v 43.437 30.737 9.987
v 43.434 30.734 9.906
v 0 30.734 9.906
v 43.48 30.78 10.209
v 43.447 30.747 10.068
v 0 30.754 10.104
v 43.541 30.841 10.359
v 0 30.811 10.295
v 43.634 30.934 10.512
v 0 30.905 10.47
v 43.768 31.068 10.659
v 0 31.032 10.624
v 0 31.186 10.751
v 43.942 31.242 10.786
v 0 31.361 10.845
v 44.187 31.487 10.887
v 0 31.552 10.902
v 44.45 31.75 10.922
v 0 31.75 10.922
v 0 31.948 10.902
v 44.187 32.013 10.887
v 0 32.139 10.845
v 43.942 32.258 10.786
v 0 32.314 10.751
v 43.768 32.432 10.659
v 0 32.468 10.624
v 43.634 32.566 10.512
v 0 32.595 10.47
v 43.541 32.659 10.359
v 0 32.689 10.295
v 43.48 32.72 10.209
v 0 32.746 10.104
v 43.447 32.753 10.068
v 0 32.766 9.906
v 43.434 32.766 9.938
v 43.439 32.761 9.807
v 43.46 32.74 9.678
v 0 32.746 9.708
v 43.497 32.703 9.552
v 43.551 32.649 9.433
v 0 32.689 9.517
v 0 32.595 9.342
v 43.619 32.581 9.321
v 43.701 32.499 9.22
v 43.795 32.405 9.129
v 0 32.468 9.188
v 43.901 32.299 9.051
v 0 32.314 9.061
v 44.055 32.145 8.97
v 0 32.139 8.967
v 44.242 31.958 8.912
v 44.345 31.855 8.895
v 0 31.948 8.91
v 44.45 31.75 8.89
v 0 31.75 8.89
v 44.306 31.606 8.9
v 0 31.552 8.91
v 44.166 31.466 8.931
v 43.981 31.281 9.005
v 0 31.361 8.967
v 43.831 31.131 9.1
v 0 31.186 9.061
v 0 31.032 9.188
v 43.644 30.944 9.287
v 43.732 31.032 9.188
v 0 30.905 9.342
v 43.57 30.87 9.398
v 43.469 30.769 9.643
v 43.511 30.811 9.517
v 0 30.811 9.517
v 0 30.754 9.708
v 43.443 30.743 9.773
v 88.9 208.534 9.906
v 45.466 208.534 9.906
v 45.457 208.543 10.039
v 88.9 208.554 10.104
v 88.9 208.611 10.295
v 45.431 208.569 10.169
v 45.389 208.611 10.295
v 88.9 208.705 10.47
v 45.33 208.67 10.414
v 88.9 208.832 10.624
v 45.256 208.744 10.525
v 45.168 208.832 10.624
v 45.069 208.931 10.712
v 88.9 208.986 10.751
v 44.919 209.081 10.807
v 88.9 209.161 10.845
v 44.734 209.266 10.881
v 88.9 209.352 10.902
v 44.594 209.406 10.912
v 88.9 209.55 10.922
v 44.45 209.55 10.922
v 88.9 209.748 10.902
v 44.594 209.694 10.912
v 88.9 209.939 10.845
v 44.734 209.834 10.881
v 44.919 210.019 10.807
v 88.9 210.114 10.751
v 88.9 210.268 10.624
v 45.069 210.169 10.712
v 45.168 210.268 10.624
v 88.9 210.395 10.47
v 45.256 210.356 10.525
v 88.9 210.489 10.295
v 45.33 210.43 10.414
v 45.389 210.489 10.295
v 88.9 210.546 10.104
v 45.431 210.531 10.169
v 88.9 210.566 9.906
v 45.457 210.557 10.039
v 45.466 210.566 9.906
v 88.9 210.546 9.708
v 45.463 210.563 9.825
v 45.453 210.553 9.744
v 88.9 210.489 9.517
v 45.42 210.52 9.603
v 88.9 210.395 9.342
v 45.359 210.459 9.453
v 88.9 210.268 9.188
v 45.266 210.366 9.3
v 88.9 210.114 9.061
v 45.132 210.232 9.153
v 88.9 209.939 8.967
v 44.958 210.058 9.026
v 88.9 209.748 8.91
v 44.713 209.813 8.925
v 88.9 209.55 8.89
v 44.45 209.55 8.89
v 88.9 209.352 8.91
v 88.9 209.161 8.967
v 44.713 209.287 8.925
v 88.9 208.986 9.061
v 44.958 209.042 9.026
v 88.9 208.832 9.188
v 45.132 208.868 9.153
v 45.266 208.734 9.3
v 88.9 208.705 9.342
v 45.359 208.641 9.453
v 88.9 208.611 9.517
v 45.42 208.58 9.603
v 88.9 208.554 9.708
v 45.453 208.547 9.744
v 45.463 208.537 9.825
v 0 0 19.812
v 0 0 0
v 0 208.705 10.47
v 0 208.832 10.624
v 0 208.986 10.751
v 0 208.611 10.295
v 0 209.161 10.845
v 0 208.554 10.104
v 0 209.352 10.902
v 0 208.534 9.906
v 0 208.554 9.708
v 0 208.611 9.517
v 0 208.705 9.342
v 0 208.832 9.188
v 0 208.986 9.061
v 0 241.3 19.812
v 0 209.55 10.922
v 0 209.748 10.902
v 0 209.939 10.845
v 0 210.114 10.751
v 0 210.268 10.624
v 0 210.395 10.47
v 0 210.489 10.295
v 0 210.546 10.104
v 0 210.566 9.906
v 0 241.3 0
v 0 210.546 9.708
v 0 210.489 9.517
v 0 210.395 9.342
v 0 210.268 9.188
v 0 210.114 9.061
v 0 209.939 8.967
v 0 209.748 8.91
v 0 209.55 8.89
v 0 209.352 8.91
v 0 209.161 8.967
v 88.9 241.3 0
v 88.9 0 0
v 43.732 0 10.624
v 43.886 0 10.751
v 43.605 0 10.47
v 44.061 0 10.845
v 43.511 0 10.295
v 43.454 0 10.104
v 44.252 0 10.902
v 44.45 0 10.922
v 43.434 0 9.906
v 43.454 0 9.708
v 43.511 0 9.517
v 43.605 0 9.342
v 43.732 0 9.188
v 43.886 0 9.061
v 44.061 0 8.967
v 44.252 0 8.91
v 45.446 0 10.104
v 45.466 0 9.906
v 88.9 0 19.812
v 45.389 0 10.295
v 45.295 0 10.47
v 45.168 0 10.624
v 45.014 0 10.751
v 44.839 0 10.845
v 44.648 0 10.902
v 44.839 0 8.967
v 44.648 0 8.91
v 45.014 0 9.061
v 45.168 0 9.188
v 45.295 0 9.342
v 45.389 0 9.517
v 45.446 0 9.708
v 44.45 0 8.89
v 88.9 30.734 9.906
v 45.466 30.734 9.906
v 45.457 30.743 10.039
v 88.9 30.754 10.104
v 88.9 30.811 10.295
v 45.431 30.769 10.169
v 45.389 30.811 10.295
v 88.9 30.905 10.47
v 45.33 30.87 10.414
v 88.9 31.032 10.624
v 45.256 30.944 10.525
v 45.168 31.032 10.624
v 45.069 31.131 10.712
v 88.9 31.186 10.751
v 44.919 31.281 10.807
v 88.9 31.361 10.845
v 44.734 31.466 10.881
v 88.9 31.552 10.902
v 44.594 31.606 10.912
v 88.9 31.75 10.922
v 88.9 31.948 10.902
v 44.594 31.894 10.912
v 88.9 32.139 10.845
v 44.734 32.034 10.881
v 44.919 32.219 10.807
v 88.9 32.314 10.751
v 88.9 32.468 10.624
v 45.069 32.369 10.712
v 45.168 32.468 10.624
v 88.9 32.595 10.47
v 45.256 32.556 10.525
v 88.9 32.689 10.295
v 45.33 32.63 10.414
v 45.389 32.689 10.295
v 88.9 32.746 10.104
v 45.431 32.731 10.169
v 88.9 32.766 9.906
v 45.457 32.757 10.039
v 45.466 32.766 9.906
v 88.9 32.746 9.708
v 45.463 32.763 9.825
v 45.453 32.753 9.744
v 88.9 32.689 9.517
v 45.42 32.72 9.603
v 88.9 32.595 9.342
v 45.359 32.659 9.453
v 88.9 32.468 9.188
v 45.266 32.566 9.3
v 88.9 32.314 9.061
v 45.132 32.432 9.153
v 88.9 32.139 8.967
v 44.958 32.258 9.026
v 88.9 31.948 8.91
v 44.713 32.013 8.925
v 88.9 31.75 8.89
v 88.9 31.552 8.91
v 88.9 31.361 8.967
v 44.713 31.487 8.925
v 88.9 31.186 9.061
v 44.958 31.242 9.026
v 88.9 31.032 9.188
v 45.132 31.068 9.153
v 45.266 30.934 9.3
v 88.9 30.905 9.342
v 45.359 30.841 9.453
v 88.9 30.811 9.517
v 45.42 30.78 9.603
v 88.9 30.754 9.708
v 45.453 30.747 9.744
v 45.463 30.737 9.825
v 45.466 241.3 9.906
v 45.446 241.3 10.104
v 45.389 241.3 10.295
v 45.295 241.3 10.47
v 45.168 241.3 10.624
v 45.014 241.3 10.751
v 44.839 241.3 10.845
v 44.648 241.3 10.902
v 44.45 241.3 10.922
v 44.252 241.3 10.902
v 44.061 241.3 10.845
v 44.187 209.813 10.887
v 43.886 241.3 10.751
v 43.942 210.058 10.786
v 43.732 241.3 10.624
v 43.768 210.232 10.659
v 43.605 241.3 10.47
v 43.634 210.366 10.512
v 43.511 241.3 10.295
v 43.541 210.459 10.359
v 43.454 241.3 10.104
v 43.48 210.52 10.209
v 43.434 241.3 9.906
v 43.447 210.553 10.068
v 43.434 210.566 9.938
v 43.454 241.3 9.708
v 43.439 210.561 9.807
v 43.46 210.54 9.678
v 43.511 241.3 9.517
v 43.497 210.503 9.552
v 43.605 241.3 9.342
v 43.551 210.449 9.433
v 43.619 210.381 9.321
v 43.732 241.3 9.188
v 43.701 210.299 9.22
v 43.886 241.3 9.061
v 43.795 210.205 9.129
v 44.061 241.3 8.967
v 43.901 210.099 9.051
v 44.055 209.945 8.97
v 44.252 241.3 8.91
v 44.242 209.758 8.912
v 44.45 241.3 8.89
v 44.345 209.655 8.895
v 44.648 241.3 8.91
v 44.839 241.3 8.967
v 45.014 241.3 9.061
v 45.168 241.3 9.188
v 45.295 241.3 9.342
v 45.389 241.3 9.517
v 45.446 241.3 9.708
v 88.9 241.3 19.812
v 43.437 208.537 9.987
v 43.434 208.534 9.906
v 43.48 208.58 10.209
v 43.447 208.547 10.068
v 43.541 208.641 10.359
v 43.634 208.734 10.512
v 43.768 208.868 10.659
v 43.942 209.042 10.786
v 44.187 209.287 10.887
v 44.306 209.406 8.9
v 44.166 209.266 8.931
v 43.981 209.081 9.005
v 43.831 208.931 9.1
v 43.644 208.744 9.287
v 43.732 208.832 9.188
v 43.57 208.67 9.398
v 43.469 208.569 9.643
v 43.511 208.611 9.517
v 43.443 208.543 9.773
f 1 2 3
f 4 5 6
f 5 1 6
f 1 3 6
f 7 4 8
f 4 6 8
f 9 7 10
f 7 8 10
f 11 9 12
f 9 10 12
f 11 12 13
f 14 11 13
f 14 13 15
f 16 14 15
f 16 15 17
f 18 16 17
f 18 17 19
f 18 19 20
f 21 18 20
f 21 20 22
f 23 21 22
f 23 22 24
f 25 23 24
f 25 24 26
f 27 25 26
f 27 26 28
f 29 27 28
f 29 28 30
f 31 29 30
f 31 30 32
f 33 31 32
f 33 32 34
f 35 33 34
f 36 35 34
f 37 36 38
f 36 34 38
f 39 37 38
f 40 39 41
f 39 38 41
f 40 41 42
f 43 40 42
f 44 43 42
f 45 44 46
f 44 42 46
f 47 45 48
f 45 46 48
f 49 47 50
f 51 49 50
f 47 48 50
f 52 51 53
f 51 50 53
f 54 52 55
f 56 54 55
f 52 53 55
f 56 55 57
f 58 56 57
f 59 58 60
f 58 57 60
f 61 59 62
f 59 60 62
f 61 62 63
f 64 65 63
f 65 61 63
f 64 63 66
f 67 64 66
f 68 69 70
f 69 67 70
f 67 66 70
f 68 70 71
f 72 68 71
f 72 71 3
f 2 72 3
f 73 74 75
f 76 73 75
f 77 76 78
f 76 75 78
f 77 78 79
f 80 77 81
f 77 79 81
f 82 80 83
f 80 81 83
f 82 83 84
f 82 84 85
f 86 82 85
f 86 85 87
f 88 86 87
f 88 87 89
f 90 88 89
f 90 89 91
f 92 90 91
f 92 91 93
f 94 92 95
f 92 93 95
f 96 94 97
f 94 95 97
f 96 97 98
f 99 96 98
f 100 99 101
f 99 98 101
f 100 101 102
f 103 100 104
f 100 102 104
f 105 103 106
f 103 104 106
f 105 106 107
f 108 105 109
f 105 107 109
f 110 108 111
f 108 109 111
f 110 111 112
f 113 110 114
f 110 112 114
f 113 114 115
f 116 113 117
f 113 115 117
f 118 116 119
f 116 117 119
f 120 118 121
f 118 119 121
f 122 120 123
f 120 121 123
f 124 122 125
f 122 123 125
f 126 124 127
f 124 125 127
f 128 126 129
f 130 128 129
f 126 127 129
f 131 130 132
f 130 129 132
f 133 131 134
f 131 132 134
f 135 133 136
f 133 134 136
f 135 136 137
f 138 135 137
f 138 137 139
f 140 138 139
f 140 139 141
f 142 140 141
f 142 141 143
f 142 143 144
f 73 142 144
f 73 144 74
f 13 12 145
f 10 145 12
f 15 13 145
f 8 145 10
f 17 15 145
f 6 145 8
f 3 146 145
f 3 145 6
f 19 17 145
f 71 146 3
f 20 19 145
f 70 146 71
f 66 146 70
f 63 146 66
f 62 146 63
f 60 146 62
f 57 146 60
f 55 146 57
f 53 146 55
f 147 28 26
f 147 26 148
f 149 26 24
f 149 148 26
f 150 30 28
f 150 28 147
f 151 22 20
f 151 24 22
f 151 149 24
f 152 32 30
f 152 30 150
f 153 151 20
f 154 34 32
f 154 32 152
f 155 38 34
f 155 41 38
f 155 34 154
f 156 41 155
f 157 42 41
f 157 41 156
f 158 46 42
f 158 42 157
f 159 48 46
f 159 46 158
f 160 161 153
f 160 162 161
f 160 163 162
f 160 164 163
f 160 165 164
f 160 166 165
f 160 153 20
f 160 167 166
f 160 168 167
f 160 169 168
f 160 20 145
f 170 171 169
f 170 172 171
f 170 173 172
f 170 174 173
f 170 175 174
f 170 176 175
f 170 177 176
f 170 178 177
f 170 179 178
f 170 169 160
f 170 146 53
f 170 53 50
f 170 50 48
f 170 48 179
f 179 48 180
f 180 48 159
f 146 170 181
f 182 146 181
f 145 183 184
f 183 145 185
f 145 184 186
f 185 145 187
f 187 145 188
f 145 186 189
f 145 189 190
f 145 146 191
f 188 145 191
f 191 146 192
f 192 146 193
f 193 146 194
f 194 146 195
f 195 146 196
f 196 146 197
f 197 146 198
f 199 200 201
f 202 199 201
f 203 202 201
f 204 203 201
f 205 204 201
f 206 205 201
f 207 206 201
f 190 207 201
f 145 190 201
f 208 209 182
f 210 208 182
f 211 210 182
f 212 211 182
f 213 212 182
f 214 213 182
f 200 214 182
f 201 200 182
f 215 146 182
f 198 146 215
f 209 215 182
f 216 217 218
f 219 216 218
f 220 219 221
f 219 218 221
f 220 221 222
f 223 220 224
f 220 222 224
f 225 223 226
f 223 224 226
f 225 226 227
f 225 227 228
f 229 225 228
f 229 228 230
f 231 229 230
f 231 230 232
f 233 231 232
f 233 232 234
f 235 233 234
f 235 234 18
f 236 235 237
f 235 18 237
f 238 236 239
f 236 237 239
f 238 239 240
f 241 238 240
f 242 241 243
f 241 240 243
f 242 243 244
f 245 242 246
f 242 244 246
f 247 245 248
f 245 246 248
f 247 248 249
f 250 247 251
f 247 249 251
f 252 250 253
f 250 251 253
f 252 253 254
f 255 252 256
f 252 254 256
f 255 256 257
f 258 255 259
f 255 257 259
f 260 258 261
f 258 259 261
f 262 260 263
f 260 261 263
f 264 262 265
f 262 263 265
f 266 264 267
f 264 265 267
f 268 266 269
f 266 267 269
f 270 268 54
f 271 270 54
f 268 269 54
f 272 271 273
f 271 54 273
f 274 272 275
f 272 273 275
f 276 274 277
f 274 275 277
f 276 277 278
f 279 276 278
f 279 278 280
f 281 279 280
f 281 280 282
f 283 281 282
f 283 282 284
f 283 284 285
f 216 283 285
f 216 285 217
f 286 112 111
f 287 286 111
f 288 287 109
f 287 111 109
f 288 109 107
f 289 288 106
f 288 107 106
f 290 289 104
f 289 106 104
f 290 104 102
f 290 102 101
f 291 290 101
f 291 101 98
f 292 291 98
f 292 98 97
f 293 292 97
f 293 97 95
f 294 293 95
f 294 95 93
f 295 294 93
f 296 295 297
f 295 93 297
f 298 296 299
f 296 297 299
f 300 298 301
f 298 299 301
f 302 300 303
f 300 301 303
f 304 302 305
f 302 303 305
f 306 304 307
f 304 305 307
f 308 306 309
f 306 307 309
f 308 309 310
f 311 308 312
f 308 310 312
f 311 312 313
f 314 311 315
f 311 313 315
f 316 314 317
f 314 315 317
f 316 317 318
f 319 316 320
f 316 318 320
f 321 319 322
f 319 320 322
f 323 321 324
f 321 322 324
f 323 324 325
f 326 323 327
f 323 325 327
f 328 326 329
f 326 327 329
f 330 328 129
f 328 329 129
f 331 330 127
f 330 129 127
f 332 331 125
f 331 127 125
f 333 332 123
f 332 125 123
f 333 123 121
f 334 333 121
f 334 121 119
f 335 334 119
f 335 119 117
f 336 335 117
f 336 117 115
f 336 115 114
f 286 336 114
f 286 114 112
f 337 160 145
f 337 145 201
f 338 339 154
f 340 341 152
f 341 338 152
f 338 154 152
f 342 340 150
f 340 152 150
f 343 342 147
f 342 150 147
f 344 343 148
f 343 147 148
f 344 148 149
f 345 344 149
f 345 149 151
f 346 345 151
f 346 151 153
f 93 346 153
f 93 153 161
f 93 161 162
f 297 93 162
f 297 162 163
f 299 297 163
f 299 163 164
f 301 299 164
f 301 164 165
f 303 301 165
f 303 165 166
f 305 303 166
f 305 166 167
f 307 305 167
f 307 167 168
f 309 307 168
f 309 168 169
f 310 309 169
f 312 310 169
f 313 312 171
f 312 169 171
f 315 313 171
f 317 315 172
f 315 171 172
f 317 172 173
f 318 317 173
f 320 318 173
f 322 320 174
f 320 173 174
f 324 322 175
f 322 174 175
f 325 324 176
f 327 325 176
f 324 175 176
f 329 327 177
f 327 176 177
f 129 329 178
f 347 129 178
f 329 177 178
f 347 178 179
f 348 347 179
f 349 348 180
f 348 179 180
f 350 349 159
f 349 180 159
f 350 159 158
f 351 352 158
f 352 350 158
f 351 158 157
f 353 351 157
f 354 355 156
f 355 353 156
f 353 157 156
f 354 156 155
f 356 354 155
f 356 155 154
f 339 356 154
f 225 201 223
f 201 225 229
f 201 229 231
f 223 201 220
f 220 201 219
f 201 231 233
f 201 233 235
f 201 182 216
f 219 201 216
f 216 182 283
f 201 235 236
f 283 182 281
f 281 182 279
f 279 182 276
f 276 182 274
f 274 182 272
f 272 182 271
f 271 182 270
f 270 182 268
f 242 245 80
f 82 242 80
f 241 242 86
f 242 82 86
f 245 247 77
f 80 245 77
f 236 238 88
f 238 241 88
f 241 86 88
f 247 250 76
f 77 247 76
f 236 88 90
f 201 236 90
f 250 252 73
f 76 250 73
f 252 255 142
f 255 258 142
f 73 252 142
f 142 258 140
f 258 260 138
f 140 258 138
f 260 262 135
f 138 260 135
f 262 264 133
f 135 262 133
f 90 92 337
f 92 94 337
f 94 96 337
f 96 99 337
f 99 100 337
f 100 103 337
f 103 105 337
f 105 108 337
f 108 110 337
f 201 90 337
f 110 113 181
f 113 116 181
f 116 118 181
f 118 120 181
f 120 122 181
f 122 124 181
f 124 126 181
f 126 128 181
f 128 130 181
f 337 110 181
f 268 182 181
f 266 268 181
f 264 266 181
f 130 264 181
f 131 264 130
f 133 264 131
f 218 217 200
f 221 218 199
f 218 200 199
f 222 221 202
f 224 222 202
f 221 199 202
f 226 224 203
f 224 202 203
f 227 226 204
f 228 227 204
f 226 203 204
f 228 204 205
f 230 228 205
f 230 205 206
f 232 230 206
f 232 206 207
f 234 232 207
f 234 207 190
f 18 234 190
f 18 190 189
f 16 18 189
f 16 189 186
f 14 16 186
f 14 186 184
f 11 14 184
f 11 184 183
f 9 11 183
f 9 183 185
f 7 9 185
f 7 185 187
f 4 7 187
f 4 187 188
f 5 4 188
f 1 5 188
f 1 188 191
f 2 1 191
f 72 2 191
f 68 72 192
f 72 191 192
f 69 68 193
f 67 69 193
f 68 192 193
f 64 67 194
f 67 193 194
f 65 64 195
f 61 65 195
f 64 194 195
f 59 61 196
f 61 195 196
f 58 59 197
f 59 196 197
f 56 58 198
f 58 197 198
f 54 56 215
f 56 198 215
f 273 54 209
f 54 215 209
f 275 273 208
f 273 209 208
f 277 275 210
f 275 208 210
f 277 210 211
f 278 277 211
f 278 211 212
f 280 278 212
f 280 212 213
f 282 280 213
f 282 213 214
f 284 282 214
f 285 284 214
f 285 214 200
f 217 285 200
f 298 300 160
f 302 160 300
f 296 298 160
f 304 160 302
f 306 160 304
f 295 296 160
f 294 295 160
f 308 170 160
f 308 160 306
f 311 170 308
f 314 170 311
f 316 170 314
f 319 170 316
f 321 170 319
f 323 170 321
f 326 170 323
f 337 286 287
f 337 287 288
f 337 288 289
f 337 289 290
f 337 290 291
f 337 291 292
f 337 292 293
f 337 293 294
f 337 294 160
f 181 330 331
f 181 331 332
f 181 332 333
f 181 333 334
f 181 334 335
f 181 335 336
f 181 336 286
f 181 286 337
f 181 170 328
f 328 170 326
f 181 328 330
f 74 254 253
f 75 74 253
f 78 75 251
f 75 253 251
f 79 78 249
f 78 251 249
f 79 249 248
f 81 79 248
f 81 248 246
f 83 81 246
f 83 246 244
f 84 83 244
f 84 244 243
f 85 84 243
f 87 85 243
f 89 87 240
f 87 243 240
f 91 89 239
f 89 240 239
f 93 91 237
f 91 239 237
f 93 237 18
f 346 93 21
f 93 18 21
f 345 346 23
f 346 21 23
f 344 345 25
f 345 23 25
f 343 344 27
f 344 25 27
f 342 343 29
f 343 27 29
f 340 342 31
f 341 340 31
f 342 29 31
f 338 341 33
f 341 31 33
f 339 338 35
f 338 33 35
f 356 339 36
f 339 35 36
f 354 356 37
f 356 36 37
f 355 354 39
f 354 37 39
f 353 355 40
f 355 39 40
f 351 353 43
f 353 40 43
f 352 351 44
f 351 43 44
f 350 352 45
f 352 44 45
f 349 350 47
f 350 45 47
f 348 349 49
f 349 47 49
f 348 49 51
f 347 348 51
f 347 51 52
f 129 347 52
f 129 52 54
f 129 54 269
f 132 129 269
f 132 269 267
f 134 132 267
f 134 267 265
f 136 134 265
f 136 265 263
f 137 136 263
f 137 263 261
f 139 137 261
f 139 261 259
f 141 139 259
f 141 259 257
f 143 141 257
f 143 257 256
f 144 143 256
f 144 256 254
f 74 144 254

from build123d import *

# Parameters (mm, degrees)
F0_W     = 88.9
F0_H     = 241.3
F1_DEPTH = 19.812
F2_R     = 1.016
F3_DEPTH = 241.301
F4_R     = 1.016
F5_DEPTH = 88.901


with BuildPart() as f1:
    # F0 (on Top) → F1 (new body)
    with BuildSketch(Plane.XY):
        with Locations((44.45, 120.65)):
            Rectangle(F0_W, F0_H)
    extrude(amount=F1_DEPTH)

    # F2 (on face) → F3 (cut, through all)
    with BuildSketch(Plane.XZ):
        with Locations((44.45, 9.906)):
            Circle(F2_R)
    extrude(amount=-F3_DEPTH, mode=Mode.SUBTRACT)

    # F4 (on face) → F5 (cut, through all)
    with BuildSketch(Plane(origin=(0, 0, 0), x_dir=(0, -1, 0), z_dir=(-1, 0, 0))):
        with Locations((-209.55, 9.906)):
            Circle(F4_R)
        with Locations((-31.75, 9.906)):
            Circle(F4_R)
    extrude(amount=-F5_DEPTH, mode=Mode.SUBTRACT)


solid = f1.part
